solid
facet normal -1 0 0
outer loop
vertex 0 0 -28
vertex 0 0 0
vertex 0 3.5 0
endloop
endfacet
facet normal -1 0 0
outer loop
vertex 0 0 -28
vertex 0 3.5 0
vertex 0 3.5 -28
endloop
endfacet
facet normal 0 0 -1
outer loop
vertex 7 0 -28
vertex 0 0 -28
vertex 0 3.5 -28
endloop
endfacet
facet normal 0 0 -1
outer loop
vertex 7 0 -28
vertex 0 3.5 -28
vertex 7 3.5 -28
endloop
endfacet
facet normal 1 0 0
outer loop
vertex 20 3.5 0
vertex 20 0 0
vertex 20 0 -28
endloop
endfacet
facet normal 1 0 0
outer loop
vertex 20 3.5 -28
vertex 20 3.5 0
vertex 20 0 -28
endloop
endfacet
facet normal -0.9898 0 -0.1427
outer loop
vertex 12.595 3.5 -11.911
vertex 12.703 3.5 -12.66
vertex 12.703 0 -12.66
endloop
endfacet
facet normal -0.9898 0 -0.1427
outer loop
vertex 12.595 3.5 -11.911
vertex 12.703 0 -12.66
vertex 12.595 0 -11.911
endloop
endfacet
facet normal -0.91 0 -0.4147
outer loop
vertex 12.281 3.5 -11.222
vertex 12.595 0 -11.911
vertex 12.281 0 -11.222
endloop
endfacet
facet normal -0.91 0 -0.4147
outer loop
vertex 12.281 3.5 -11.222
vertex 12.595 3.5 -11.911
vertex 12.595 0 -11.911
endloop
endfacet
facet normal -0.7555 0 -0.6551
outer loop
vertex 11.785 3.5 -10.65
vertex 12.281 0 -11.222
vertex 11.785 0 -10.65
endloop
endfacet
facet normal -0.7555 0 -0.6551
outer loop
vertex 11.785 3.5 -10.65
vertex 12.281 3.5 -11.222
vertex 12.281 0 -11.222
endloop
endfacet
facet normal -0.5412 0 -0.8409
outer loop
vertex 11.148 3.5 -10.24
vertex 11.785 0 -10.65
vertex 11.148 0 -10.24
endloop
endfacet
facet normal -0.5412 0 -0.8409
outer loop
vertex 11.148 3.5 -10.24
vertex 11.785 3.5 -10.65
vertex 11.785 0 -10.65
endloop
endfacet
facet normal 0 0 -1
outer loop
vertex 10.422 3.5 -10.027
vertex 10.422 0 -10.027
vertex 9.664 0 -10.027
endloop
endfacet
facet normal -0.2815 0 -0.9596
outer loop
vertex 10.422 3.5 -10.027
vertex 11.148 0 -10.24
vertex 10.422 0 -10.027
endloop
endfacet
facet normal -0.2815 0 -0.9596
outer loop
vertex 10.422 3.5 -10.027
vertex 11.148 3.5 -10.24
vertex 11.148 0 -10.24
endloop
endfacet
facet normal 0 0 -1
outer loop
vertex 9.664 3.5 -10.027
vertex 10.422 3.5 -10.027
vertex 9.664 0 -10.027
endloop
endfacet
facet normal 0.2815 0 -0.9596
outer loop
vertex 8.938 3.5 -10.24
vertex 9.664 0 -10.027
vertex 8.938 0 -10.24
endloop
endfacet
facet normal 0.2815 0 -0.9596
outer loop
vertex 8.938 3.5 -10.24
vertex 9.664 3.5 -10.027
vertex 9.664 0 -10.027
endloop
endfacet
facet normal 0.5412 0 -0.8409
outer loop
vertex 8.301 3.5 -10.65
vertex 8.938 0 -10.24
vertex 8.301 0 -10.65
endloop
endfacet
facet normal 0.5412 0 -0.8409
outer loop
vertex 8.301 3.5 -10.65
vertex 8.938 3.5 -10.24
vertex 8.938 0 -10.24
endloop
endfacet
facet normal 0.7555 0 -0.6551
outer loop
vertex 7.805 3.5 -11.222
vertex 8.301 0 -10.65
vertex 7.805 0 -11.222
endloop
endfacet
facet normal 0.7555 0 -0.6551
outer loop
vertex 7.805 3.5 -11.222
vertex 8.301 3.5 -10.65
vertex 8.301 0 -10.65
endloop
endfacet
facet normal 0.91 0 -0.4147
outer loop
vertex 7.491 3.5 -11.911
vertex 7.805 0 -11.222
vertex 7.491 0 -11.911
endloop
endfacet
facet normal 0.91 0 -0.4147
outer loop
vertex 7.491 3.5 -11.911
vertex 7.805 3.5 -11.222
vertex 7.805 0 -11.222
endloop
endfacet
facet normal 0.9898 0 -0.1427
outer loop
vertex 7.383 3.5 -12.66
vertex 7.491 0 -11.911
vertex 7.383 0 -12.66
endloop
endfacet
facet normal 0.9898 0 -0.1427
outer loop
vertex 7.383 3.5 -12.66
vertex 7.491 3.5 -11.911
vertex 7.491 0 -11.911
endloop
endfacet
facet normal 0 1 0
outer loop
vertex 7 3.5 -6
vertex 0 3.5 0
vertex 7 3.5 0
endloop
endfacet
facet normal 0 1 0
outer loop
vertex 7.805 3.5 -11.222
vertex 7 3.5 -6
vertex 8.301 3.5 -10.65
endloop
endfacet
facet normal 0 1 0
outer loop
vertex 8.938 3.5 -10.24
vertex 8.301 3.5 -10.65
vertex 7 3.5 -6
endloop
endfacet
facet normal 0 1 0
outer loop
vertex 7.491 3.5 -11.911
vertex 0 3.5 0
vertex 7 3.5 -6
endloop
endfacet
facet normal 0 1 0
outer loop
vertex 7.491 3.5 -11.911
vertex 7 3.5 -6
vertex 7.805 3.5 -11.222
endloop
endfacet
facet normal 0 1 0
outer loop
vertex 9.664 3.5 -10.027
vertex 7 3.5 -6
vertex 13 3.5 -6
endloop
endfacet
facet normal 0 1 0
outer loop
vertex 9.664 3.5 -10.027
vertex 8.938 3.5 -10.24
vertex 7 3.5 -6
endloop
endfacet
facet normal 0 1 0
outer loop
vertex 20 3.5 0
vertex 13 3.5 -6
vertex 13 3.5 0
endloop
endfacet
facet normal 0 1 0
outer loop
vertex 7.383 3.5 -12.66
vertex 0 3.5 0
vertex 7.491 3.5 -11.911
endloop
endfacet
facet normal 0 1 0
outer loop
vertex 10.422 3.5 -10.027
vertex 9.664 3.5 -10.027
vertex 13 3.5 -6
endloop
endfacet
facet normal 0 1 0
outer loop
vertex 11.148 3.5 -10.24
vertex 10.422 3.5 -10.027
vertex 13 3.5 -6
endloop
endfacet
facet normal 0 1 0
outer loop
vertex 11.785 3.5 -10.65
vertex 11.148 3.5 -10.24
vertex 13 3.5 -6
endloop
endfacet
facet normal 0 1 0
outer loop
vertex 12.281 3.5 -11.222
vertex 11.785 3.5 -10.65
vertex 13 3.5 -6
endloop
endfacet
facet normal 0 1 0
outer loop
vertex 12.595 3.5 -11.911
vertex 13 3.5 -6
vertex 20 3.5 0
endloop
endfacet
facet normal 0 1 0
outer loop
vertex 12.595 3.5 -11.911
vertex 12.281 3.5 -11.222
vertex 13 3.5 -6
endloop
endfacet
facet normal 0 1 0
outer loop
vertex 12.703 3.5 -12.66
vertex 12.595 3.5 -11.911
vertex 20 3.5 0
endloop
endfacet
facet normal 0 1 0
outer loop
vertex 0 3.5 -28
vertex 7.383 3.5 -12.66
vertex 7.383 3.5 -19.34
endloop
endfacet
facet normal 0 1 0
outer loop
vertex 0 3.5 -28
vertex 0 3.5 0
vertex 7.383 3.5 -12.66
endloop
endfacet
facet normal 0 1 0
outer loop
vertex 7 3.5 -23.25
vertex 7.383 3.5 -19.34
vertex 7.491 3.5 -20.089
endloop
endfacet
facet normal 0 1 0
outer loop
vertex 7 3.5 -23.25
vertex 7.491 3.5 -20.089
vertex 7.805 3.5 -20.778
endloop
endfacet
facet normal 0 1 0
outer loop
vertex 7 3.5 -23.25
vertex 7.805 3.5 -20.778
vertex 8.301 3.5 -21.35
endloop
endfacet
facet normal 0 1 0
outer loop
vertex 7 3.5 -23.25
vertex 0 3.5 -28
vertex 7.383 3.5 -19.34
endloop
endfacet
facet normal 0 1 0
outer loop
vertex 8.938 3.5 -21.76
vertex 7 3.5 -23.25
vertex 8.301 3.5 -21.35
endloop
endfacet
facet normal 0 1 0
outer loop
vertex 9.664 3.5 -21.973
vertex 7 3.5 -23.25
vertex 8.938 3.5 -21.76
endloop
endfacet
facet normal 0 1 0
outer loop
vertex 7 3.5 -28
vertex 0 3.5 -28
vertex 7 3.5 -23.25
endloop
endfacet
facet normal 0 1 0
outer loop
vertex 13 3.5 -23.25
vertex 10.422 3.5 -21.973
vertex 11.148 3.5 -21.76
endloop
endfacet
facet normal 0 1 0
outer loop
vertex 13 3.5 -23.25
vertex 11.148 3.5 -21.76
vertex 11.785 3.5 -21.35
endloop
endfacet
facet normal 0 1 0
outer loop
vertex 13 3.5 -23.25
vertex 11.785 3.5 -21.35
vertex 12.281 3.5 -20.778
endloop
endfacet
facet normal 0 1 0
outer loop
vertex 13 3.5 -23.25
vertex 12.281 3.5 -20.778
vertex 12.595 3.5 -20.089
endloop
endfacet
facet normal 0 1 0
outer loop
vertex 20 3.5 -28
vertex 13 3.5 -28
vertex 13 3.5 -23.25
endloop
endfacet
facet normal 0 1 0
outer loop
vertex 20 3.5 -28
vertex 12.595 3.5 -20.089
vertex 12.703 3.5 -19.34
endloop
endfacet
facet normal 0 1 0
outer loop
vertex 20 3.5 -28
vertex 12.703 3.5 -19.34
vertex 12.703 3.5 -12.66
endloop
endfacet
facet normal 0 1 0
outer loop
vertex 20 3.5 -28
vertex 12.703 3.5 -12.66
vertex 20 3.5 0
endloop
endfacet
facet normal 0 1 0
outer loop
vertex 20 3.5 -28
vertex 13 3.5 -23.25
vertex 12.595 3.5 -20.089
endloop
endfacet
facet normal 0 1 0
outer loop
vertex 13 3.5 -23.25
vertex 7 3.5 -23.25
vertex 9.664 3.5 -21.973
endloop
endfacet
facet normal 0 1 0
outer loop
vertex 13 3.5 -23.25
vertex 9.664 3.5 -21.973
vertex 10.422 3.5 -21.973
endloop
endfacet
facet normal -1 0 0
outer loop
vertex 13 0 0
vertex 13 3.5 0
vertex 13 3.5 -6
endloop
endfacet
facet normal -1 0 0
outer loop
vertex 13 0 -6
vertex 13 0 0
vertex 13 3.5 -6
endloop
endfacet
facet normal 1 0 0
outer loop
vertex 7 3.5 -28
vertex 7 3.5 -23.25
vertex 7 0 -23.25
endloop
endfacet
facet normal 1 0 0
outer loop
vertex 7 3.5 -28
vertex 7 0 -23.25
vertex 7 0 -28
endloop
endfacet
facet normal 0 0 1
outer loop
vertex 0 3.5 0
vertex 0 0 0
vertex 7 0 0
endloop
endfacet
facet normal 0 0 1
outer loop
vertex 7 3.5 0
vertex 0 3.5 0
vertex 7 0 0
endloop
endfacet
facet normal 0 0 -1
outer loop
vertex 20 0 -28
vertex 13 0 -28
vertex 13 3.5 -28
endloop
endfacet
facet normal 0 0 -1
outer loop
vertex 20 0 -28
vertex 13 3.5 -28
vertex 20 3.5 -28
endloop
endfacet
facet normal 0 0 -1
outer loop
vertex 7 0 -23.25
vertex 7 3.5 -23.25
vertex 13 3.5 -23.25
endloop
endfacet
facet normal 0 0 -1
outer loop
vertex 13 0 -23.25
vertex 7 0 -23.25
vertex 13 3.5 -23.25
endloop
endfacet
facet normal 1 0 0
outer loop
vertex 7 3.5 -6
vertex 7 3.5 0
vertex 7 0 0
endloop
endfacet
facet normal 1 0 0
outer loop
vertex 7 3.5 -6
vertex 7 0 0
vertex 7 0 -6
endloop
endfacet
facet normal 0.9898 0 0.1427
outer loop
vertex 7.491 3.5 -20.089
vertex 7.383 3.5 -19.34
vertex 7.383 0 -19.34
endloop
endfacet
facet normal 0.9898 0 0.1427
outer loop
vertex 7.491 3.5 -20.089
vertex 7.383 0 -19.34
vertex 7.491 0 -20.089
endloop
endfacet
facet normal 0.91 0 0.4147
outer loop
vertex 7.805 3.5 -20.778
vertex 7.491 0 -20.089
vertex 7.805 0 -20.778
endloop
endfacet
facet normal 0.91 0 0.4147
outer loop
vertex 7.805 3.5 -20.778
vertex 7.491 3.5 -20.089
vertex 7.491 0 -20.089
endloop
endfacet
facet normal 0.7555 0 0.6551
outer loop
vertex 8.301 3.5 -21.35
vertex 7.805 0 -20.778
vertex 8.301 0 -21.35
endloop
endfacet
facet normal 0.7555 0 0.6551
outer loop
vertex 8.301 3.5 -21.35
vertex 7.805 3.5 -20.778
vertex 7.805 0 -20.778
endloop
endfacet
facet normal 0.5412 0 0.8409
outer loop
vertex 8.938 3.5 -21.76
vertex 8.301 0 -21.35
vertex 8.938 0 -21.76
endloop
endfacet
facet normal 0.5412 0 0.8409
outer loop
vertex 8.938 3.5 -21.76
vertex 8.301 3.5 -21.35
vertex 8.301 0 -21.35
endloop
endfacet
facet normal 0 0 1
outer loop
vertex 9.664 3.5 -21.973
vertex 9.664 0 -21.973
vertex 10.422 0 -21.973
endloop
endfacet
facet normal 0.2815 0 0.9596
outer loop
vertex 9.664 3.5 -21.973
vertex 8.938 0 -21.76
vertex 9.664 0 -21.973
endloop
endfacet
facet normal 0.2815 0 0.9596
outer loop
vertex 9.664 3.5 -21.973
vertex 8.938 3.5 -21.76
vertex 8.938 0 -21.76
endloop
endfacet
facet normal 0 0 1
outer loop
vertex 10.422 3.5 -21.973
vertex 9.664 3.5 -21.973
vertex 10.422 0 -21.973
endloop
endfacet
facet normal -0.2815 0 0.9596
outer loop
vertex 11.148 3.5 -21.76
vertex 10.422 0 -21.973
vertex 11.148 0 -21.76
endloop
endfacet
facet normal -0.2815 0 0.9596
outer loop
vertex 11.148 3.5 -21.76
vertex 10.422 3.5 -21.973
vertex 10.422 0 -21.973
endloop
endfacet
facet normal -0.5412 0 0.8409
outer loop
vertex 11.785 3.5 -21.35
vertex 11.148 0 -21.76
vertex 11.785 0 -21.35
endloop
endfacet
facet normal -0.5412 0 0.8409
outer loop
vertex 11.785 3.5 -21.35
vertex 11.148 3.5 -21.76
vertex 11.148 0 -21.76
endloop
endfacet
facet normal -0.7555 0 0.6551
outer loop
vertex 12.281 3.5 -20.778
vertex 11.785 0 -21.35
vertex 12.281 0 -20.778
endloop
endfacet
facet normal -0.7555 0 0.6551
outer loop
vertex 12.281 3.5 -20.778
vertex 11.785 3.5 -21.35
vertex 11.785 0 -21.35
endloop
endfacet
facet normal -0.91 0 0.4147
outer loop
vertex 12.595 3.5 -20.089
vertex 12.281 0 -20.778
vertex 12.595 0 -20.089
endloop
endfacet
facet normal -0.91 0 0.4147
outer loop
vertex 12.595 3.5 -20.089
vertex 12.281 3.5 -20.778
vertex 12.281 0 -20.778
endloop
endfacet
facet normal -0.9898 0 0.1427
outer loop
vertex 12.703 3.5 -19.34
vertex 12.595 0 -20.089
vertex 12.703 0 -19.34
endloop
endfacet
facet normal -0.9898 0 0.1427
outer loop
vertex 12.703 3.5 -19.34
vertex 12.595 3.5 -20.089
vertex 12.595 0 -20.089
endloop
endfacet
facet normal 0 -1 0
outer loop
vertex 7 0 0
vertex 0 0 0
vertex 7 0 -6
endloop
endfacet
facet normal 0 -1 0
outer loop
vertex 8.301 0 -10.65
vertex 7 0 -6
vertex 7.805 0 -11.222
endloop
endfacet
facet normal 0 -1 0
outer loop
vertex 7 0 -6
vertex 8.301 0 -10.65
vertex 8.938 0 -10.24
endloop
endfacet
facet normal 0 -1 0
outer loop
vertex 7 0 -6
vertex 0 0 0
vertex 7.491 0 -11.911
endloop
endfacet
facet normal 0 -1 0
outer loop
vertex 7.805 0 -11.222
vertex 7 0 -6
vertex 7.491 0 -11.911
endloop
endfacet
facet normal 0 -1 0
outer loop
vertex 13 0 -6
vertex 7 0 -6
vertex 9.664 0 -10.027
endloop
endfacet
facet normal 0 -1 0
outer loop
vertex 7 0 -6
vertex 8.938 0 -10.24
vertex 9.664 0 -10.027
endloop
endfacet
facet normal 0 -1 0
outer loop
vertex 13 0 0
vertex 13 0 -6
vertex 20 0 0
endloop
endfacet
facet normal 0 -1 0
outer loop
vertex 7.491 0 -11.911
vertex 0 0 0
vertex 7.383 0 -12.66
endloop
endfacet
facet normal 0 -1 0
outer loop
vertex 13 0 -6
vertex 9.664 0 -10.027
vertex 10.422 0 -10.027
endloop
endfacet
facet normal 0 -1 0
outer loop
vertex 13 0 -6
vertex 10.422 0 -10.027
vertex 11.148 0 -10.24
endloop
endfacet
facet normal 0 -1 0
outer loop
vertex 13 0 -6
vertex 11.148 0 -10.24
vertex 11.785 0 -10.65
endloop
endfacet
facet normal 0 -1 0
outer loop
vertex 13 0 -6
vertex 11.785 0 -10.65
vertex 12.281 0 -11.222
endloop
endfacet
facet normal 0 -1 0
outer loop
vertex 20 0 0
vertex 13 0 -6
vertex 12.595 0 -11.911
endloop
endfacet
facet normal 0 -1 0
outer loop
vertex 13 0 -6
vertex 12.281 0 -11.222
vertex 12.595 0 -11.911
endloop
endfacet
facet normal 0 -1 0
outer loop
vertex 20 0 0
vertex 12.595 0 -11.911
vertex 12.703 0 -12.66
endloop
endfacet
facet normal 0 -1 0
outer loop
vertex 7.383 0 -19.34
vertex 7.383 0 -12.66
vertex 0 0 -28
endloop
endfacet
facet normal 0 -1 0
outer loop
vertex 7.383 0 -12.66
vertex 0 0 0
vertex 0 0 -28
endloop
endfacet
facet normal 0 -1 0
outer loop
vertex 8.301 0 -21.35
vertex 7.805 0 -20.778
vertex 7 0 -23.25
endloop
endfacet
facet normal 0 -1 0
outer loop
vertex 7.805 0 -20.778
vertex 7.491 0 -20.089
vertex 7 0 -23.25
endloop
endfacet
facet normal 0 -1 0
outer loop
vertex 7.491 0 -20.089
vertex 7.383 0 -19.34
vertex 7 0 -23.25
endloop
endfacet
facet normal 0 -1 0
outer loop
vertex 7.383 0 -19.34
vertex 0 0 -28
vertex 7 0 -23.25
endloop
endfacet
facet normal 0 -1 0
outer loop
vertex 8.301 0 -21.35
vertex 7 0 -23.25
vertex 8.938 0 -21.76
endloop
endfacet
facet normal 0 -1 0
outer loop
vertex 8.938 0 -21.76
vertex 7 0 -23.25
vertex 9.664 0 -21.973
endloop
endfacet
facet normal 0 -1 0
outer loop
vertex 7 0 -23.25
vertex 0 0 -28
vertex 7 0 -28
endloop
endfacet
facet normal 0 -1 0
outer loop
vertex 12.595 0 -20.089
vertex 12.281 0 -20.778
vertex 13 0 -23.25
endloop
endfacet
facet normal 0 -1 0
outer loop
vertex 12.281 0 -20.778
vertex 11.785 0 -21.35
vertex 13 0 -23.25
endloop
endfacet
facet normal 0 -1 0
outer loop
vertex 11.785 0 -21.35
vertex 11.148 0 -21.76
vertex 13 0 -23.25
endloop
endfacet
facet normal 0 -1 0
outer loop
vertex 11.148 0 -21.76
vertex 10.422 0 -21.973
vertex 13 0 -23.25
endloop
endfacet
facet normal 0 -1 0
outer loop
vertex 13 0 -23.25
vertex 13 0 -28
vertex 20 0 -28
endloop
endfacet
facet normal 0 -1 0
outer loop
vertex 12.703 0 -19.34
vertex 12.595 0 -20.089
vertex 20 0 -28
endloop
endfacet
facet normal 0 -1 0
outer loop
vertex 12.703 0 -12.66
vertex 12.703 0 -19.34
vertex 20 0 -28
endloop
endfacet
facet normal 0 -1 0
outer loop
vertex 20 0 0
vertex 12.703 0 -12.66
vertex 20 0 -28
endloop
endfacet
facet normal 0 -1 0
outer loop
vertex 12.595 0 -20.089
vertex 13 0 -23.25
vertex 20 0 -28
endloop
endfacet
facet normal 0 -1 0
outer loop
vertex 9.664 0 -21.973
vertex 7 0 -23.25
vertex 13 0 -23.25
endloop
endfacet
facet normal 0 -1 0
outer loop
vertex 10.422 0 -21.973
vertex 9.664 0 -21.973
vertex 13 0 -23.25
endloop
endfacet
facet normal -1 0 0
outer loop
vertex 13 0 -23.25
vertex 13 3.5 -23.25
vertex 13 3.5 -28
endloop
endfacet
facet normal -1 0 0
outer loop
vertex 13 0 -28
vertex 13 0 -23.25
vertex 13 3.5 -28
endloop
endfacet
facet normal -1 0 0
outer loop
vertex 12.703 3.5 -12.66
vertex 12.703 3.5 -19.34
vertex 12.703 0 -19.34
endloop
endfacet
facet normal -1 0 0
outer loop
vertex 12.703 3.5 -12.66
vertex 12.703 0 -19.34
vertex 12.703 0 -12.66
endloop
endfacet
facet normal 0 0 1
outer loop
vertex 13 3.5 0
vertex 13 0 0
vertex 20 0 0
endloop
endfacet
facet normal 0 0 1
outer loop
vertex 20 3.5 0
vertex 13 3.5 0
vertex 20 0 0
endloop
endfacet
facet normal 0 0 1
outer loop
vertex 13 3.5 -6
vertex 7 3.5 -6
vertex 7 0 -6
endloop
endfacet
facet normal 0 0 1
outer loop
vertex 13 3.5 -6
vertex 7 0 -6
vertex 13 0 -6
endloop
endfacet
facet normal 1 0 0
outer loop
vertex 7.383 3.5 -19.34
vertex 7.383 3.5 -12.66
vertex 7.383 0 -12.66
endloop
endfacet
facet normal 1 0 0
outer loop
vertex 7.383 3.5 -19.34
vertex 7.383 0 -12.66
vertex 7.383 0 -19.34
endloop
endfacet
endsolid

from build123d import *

# Parameters (mm, degrees)
SKETCH1_W           = 20
SKETCH1_H           = 28
BOSS_EXTRUDE1_DEPTH = 3.5
SKETCH2_W           = 6
SKETCH2_H           = 4.75
SKETCH2_H_2         = 6
CUT_EXTRUDE1_DEPTH  = 4.5
CUT_EXTRUDE6_DEPTH  = 4.5


with BuildPart() as part:
    # Sketch1 → Boss-Extrude1 (new body)
    with BuildSketch(Plane(origin=(0, 0, 0), x_dir=(1, 0, 0), z_dir=(0, 1, 0))):
        with Locations((10, 14)):
            Rectangle(SKETCH1_W, SKETCH1_H)
    extrude(amount=BOSS_EXTRUDE1_DEPTH)

    # Sketch2 → Cut-Extrude1 (cut, through all)
    with BuildSketch(Plane(origin=(0, 3.5, 0), x_dir=(1, 0, 0), z_dir=(0, 1, 0))):
        with Locations((10, 25.625)):
            Rectangle(SKETCH2_W, SKETCH2_H)
        with Locations((10, 3)):
            Rectangle(SKETCH2_W, SKETCH2_H_2)
    extrude(amount=-CUT_EXTRUDE1_DEPTH, mode=Mode.SUBTRACT)

    # Sketch4 → Cut-Extrude6 (cut, through all)
    with BuildSketch(Plane(origin=(0, 3.5, 0), x_dir=(1, 0, 0), z_dir=(0, 1, 0))):
        with BuildLine():
            Line((12.702975316, 19.34), (12.702975316, 12.66))
            ThreePointArc((12.702975316, 12.66), (10.042975316, 10), (7.382975316, 12.66))
            Line((7.382975316, 12.66), (7.382975316, 19.34))
            ThreePointArc((7.382975316, 19.34), (10.042975316, 22), (12.702975316, 19.34))
        make_face()
    extrude(amount=-CUT_EXTRUDE6_DEPTH, mode=Mode.SUBTRACT)


solid = part.part
